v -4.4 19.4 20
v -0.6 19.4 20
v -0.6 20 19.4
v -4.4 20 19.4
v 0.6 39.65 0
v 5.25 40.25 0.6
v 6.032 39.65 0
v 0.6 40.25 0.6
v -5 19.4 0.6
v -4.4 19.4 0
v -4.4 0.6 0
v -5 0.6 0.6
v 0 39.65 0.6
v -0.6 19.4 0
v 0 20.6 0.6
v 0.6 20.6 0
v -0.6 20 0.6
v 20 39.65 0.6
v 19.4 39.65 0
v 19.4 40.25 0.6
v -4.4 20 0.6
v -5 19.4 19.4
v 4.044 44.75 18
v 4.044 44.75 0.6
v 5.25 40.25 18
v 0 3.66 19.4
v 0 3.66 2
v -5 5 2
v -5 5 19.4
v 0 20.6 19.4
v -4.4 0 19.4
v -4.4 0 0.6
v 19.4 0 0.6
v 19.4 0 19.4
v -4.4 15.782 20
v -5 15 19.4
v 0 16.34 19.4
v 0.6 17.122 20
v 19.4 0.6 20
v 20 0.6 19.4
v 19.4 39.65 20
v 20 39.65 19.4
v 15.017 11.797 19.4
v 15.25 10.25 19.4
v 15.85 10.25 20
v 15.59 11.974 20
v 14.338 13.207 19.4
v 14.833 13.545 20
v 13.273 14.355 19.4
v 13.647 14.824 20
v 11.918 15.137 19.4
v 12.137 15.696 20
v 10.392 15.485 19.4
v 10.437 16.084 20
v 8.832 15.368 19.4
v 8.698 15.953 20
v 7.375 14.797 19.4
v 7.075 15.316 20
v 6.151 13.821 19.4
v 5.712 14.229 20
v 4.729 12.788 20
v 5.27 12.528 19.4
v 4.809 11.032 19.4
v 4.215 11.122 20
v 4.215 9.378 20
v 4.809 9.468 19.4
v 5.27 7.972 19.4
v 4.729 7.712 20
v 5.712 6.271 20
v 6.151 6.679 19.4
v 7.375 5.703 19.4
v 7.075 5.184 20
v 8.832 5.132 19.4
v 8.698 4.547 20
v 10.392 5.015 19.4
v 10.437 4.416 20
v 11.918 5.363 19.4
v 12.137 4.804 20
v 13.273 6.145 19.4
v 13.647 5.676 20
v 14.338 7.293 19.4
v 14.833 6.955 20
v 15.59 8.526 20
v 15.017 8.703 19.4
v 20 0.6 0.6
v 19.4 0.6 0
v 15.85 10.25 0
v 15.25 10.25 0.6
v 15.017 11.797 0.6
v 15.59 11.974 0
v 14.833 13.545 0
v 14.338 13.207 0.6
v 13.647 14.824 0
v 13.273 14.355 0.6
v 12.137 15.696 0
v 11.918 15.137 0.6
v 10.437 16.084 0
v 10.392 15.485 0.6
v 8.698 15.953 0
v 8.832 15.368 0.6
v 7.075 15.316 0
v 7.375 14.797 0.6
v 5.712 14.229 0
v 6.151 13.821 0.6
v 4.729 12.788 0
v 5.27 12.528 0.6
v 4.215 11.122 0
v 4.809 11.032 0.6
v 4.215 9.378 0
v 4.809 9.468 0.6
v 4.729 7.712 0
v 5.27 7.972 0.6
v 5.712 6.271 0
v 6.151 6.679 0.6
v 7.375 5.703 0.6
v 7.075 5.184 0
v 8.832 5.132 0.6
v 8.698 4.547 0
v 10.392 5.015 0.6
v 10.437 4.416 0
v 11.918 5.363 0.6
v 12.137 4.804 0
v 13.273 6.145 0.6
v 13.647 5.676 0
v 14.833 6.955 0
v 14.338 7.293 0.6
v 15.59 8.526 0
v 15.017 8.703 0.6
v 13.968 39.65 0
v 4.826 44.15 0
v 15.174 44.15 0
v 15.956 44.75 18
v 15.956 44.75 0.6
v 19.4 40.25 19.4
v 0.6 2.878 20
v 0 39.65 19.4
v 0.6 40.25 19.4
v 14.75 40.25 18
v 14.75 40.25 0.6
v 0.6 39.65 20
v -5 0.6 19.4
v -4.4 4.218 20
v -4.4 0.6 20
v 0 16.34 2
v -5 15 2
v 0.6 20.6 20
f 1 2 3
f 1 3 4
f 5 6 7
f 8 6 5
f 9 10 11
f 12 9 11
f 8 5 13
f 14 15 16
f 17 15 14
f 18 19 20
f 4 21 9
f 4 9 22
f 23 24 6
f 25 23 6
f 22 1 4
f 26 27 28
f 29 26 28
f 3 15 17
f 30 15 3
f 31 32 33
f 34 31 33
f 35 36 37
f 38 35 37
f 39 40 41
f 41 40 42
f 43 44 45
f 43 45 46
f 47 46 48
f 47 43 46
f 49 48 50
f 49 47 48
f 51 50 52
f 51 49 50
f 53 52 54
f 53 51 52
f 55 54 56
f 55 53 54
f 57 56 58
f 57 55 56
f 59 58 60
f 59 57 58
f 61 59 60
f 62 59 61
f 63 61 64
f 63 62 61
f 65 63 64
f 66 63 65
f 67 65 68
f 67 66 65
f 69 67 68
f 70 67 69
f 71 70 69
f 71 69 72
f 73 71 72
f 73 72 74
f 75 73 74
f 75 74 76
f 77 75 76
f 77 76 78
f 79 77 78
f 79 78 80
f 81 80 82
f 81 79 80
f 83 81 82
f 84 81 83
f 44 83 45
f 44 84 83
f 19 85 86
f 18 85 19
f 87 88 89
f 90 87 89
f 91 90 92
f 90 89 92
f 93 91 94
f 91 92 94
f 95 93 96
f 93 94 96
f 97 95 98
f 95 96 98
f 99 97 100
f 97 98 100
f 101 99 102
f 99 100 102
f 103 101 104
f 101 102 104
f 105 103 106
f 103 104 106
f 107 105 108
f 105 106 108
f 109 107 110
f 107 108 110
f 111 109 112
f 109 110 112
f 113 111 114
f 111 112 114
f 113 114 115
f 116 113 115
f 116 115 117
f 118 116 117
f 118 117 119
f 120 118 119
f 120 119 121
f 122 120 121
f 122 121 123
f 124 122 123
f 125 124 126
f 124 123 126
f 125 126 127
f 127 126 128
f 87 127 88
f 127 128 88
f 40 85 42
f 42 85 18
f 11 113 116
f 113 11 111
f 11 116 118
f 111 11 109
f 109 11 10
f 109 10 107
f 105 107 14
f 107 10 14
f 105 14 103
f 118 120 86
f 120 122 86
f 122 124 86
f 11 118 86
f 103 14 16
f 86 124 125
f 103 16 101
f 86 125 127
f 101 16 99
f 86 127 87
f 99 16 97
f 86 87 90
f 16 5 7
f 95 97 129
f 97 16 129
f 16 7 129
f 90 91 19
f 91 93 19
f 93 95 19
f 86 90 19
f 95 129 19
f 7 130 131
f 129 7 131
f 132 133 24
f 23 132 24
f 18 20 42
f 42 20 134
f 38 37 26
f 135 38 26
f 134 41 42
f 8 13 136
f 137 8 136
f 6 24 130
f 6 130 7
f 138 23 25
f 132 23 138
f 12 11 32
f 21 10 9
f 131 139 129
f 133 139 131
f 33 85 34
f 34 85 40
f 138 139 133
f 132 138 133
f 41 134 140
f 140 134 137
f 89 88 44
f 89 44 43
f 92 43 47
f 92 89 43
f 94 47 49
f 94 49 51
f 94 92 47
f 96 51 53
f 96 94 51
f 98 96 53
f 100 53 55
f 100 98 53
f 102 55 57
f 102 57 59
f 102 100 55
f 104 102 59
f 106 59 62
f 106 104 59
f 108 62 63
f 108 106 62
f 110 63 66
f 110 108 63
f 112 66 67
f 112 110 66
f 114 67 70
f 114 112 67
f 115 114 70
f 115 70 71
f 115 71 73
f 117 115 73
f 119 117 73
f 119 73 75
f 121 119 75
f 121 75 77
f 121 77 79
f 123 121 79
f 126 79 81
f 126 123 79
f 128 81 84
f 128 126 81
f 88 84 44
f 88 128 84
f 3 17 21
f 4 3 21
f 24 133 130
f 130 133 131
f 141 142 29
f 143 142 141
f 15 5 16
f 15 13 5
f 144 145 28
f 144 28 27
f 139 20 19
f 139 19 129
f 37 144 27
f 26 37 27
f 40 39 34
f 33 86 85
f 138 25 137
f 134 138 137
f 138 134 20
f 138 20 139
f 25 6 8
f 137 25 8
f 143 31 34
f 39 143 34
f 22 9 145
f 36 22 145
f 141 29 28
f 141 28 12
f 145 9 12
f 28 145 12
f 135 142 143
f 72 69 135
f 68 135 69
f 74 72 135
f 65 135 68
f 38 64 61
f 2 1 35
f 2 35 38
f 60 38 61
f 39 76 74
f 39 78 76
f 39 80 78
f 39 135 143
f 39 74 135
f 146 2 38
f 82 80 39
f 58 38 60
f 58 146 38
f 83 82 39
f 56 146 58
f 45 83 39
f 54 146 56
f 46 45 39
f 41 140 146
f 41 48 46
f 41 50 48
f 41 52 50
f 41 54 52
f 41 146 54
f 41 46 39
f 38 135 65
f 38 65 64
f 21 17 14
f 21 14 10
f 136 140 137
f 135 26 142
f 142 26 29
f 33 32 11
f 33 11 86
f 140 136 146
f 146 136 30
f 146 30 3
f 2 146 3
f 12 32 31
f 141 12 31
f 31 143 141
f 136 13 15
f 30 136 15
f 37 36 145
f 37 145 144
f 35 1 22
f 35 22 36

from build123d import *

# Parameters (mm, degrees)
F2_R     = 5.25
F3_DEPTH = 20
F4_DEPTH = 2
F5_DEPTH = 18
F6_SIZE  = 0.6


with BuildPart() as f3:
    # F2 (on Top) → F3 (new body)
    with BuildSketch(Plane.XY):
        Polygon((5.25, 40.25), (0, 40.25), (0, 20), (0, 16.3397459622), (0, 3.6602540378), (0, 0), (20, 0), (20, 40.25), (14.75, 40.25), align=None)
        with Locations((10, 10.25)):
            Circle(F2_R, mode=Mode.SUBTRACT)
        Polygon((0, 16.3397459622), (0, 20), (-5, 20), (-5, 15), align=None)
        Polygon((0, 0), (0, 3.6602540378), (-5, 5), (-5, 0), align=None)
    extrude(amount=F3_DEPTH)

    # F2 (on Top) → F4 (join)
    with BuildSketch(Plane.XY):
        Polygon((0, 3.6602540378), (0, 16.3397459622), (-5, 15), (-5, 5), align=None)
    extrude(amount=F4_DEPTH)

    # F2 (on Top) → F5 (join)
    with BuildSketch(Plane.XY):
        Polygon((4.0442286341, 44.75), (5.25, 40.25), (14.75, 40.25), (15.9557713659, 44.75), align=None)
    extrude(amount=F5_DEPTH)

    # F6
    f6_edges = [f3.edges().sort_by_distance(p)[0] for p in [
        (0, 30.125, 0),
        (-2.5, 20, 0),
        (-5, 10, 0),
        (7.5, 0, 0),
        (20, 20.125, 0),
        (17.375, 40.25, 0),
        (15.352886, 42.5, 0),
        (10, 44.75, 0),
        (4.647114, 42.5, 0),
        (2.625, 40.25, 0),
        (4.75, 10.25, 0),
        (0, 30.125, 20),
        (-2.5, 20, 20),
        (-5, 17.5, 20),
        (-2.5, 15.669873, 20),
        (0, 10, 20),
        (-2.5, 4.330127, 20),
        (-5, 2.5, 20),
        (7.5, 0, 20),
        (20, 20.125, 20),
        (10, 40.25, 20),
        (4.75, 10.25, 20),
        (-5, 0, 10),
        (20, 0, 10),
        (20, 40.25, 10),
        (0, 20, 10),
        (-5, 20, 10),
        (0, 40.25, 10),
    ]]
    chamfer(f6_edges, length=F6_SIZE)


solid = f3.part
